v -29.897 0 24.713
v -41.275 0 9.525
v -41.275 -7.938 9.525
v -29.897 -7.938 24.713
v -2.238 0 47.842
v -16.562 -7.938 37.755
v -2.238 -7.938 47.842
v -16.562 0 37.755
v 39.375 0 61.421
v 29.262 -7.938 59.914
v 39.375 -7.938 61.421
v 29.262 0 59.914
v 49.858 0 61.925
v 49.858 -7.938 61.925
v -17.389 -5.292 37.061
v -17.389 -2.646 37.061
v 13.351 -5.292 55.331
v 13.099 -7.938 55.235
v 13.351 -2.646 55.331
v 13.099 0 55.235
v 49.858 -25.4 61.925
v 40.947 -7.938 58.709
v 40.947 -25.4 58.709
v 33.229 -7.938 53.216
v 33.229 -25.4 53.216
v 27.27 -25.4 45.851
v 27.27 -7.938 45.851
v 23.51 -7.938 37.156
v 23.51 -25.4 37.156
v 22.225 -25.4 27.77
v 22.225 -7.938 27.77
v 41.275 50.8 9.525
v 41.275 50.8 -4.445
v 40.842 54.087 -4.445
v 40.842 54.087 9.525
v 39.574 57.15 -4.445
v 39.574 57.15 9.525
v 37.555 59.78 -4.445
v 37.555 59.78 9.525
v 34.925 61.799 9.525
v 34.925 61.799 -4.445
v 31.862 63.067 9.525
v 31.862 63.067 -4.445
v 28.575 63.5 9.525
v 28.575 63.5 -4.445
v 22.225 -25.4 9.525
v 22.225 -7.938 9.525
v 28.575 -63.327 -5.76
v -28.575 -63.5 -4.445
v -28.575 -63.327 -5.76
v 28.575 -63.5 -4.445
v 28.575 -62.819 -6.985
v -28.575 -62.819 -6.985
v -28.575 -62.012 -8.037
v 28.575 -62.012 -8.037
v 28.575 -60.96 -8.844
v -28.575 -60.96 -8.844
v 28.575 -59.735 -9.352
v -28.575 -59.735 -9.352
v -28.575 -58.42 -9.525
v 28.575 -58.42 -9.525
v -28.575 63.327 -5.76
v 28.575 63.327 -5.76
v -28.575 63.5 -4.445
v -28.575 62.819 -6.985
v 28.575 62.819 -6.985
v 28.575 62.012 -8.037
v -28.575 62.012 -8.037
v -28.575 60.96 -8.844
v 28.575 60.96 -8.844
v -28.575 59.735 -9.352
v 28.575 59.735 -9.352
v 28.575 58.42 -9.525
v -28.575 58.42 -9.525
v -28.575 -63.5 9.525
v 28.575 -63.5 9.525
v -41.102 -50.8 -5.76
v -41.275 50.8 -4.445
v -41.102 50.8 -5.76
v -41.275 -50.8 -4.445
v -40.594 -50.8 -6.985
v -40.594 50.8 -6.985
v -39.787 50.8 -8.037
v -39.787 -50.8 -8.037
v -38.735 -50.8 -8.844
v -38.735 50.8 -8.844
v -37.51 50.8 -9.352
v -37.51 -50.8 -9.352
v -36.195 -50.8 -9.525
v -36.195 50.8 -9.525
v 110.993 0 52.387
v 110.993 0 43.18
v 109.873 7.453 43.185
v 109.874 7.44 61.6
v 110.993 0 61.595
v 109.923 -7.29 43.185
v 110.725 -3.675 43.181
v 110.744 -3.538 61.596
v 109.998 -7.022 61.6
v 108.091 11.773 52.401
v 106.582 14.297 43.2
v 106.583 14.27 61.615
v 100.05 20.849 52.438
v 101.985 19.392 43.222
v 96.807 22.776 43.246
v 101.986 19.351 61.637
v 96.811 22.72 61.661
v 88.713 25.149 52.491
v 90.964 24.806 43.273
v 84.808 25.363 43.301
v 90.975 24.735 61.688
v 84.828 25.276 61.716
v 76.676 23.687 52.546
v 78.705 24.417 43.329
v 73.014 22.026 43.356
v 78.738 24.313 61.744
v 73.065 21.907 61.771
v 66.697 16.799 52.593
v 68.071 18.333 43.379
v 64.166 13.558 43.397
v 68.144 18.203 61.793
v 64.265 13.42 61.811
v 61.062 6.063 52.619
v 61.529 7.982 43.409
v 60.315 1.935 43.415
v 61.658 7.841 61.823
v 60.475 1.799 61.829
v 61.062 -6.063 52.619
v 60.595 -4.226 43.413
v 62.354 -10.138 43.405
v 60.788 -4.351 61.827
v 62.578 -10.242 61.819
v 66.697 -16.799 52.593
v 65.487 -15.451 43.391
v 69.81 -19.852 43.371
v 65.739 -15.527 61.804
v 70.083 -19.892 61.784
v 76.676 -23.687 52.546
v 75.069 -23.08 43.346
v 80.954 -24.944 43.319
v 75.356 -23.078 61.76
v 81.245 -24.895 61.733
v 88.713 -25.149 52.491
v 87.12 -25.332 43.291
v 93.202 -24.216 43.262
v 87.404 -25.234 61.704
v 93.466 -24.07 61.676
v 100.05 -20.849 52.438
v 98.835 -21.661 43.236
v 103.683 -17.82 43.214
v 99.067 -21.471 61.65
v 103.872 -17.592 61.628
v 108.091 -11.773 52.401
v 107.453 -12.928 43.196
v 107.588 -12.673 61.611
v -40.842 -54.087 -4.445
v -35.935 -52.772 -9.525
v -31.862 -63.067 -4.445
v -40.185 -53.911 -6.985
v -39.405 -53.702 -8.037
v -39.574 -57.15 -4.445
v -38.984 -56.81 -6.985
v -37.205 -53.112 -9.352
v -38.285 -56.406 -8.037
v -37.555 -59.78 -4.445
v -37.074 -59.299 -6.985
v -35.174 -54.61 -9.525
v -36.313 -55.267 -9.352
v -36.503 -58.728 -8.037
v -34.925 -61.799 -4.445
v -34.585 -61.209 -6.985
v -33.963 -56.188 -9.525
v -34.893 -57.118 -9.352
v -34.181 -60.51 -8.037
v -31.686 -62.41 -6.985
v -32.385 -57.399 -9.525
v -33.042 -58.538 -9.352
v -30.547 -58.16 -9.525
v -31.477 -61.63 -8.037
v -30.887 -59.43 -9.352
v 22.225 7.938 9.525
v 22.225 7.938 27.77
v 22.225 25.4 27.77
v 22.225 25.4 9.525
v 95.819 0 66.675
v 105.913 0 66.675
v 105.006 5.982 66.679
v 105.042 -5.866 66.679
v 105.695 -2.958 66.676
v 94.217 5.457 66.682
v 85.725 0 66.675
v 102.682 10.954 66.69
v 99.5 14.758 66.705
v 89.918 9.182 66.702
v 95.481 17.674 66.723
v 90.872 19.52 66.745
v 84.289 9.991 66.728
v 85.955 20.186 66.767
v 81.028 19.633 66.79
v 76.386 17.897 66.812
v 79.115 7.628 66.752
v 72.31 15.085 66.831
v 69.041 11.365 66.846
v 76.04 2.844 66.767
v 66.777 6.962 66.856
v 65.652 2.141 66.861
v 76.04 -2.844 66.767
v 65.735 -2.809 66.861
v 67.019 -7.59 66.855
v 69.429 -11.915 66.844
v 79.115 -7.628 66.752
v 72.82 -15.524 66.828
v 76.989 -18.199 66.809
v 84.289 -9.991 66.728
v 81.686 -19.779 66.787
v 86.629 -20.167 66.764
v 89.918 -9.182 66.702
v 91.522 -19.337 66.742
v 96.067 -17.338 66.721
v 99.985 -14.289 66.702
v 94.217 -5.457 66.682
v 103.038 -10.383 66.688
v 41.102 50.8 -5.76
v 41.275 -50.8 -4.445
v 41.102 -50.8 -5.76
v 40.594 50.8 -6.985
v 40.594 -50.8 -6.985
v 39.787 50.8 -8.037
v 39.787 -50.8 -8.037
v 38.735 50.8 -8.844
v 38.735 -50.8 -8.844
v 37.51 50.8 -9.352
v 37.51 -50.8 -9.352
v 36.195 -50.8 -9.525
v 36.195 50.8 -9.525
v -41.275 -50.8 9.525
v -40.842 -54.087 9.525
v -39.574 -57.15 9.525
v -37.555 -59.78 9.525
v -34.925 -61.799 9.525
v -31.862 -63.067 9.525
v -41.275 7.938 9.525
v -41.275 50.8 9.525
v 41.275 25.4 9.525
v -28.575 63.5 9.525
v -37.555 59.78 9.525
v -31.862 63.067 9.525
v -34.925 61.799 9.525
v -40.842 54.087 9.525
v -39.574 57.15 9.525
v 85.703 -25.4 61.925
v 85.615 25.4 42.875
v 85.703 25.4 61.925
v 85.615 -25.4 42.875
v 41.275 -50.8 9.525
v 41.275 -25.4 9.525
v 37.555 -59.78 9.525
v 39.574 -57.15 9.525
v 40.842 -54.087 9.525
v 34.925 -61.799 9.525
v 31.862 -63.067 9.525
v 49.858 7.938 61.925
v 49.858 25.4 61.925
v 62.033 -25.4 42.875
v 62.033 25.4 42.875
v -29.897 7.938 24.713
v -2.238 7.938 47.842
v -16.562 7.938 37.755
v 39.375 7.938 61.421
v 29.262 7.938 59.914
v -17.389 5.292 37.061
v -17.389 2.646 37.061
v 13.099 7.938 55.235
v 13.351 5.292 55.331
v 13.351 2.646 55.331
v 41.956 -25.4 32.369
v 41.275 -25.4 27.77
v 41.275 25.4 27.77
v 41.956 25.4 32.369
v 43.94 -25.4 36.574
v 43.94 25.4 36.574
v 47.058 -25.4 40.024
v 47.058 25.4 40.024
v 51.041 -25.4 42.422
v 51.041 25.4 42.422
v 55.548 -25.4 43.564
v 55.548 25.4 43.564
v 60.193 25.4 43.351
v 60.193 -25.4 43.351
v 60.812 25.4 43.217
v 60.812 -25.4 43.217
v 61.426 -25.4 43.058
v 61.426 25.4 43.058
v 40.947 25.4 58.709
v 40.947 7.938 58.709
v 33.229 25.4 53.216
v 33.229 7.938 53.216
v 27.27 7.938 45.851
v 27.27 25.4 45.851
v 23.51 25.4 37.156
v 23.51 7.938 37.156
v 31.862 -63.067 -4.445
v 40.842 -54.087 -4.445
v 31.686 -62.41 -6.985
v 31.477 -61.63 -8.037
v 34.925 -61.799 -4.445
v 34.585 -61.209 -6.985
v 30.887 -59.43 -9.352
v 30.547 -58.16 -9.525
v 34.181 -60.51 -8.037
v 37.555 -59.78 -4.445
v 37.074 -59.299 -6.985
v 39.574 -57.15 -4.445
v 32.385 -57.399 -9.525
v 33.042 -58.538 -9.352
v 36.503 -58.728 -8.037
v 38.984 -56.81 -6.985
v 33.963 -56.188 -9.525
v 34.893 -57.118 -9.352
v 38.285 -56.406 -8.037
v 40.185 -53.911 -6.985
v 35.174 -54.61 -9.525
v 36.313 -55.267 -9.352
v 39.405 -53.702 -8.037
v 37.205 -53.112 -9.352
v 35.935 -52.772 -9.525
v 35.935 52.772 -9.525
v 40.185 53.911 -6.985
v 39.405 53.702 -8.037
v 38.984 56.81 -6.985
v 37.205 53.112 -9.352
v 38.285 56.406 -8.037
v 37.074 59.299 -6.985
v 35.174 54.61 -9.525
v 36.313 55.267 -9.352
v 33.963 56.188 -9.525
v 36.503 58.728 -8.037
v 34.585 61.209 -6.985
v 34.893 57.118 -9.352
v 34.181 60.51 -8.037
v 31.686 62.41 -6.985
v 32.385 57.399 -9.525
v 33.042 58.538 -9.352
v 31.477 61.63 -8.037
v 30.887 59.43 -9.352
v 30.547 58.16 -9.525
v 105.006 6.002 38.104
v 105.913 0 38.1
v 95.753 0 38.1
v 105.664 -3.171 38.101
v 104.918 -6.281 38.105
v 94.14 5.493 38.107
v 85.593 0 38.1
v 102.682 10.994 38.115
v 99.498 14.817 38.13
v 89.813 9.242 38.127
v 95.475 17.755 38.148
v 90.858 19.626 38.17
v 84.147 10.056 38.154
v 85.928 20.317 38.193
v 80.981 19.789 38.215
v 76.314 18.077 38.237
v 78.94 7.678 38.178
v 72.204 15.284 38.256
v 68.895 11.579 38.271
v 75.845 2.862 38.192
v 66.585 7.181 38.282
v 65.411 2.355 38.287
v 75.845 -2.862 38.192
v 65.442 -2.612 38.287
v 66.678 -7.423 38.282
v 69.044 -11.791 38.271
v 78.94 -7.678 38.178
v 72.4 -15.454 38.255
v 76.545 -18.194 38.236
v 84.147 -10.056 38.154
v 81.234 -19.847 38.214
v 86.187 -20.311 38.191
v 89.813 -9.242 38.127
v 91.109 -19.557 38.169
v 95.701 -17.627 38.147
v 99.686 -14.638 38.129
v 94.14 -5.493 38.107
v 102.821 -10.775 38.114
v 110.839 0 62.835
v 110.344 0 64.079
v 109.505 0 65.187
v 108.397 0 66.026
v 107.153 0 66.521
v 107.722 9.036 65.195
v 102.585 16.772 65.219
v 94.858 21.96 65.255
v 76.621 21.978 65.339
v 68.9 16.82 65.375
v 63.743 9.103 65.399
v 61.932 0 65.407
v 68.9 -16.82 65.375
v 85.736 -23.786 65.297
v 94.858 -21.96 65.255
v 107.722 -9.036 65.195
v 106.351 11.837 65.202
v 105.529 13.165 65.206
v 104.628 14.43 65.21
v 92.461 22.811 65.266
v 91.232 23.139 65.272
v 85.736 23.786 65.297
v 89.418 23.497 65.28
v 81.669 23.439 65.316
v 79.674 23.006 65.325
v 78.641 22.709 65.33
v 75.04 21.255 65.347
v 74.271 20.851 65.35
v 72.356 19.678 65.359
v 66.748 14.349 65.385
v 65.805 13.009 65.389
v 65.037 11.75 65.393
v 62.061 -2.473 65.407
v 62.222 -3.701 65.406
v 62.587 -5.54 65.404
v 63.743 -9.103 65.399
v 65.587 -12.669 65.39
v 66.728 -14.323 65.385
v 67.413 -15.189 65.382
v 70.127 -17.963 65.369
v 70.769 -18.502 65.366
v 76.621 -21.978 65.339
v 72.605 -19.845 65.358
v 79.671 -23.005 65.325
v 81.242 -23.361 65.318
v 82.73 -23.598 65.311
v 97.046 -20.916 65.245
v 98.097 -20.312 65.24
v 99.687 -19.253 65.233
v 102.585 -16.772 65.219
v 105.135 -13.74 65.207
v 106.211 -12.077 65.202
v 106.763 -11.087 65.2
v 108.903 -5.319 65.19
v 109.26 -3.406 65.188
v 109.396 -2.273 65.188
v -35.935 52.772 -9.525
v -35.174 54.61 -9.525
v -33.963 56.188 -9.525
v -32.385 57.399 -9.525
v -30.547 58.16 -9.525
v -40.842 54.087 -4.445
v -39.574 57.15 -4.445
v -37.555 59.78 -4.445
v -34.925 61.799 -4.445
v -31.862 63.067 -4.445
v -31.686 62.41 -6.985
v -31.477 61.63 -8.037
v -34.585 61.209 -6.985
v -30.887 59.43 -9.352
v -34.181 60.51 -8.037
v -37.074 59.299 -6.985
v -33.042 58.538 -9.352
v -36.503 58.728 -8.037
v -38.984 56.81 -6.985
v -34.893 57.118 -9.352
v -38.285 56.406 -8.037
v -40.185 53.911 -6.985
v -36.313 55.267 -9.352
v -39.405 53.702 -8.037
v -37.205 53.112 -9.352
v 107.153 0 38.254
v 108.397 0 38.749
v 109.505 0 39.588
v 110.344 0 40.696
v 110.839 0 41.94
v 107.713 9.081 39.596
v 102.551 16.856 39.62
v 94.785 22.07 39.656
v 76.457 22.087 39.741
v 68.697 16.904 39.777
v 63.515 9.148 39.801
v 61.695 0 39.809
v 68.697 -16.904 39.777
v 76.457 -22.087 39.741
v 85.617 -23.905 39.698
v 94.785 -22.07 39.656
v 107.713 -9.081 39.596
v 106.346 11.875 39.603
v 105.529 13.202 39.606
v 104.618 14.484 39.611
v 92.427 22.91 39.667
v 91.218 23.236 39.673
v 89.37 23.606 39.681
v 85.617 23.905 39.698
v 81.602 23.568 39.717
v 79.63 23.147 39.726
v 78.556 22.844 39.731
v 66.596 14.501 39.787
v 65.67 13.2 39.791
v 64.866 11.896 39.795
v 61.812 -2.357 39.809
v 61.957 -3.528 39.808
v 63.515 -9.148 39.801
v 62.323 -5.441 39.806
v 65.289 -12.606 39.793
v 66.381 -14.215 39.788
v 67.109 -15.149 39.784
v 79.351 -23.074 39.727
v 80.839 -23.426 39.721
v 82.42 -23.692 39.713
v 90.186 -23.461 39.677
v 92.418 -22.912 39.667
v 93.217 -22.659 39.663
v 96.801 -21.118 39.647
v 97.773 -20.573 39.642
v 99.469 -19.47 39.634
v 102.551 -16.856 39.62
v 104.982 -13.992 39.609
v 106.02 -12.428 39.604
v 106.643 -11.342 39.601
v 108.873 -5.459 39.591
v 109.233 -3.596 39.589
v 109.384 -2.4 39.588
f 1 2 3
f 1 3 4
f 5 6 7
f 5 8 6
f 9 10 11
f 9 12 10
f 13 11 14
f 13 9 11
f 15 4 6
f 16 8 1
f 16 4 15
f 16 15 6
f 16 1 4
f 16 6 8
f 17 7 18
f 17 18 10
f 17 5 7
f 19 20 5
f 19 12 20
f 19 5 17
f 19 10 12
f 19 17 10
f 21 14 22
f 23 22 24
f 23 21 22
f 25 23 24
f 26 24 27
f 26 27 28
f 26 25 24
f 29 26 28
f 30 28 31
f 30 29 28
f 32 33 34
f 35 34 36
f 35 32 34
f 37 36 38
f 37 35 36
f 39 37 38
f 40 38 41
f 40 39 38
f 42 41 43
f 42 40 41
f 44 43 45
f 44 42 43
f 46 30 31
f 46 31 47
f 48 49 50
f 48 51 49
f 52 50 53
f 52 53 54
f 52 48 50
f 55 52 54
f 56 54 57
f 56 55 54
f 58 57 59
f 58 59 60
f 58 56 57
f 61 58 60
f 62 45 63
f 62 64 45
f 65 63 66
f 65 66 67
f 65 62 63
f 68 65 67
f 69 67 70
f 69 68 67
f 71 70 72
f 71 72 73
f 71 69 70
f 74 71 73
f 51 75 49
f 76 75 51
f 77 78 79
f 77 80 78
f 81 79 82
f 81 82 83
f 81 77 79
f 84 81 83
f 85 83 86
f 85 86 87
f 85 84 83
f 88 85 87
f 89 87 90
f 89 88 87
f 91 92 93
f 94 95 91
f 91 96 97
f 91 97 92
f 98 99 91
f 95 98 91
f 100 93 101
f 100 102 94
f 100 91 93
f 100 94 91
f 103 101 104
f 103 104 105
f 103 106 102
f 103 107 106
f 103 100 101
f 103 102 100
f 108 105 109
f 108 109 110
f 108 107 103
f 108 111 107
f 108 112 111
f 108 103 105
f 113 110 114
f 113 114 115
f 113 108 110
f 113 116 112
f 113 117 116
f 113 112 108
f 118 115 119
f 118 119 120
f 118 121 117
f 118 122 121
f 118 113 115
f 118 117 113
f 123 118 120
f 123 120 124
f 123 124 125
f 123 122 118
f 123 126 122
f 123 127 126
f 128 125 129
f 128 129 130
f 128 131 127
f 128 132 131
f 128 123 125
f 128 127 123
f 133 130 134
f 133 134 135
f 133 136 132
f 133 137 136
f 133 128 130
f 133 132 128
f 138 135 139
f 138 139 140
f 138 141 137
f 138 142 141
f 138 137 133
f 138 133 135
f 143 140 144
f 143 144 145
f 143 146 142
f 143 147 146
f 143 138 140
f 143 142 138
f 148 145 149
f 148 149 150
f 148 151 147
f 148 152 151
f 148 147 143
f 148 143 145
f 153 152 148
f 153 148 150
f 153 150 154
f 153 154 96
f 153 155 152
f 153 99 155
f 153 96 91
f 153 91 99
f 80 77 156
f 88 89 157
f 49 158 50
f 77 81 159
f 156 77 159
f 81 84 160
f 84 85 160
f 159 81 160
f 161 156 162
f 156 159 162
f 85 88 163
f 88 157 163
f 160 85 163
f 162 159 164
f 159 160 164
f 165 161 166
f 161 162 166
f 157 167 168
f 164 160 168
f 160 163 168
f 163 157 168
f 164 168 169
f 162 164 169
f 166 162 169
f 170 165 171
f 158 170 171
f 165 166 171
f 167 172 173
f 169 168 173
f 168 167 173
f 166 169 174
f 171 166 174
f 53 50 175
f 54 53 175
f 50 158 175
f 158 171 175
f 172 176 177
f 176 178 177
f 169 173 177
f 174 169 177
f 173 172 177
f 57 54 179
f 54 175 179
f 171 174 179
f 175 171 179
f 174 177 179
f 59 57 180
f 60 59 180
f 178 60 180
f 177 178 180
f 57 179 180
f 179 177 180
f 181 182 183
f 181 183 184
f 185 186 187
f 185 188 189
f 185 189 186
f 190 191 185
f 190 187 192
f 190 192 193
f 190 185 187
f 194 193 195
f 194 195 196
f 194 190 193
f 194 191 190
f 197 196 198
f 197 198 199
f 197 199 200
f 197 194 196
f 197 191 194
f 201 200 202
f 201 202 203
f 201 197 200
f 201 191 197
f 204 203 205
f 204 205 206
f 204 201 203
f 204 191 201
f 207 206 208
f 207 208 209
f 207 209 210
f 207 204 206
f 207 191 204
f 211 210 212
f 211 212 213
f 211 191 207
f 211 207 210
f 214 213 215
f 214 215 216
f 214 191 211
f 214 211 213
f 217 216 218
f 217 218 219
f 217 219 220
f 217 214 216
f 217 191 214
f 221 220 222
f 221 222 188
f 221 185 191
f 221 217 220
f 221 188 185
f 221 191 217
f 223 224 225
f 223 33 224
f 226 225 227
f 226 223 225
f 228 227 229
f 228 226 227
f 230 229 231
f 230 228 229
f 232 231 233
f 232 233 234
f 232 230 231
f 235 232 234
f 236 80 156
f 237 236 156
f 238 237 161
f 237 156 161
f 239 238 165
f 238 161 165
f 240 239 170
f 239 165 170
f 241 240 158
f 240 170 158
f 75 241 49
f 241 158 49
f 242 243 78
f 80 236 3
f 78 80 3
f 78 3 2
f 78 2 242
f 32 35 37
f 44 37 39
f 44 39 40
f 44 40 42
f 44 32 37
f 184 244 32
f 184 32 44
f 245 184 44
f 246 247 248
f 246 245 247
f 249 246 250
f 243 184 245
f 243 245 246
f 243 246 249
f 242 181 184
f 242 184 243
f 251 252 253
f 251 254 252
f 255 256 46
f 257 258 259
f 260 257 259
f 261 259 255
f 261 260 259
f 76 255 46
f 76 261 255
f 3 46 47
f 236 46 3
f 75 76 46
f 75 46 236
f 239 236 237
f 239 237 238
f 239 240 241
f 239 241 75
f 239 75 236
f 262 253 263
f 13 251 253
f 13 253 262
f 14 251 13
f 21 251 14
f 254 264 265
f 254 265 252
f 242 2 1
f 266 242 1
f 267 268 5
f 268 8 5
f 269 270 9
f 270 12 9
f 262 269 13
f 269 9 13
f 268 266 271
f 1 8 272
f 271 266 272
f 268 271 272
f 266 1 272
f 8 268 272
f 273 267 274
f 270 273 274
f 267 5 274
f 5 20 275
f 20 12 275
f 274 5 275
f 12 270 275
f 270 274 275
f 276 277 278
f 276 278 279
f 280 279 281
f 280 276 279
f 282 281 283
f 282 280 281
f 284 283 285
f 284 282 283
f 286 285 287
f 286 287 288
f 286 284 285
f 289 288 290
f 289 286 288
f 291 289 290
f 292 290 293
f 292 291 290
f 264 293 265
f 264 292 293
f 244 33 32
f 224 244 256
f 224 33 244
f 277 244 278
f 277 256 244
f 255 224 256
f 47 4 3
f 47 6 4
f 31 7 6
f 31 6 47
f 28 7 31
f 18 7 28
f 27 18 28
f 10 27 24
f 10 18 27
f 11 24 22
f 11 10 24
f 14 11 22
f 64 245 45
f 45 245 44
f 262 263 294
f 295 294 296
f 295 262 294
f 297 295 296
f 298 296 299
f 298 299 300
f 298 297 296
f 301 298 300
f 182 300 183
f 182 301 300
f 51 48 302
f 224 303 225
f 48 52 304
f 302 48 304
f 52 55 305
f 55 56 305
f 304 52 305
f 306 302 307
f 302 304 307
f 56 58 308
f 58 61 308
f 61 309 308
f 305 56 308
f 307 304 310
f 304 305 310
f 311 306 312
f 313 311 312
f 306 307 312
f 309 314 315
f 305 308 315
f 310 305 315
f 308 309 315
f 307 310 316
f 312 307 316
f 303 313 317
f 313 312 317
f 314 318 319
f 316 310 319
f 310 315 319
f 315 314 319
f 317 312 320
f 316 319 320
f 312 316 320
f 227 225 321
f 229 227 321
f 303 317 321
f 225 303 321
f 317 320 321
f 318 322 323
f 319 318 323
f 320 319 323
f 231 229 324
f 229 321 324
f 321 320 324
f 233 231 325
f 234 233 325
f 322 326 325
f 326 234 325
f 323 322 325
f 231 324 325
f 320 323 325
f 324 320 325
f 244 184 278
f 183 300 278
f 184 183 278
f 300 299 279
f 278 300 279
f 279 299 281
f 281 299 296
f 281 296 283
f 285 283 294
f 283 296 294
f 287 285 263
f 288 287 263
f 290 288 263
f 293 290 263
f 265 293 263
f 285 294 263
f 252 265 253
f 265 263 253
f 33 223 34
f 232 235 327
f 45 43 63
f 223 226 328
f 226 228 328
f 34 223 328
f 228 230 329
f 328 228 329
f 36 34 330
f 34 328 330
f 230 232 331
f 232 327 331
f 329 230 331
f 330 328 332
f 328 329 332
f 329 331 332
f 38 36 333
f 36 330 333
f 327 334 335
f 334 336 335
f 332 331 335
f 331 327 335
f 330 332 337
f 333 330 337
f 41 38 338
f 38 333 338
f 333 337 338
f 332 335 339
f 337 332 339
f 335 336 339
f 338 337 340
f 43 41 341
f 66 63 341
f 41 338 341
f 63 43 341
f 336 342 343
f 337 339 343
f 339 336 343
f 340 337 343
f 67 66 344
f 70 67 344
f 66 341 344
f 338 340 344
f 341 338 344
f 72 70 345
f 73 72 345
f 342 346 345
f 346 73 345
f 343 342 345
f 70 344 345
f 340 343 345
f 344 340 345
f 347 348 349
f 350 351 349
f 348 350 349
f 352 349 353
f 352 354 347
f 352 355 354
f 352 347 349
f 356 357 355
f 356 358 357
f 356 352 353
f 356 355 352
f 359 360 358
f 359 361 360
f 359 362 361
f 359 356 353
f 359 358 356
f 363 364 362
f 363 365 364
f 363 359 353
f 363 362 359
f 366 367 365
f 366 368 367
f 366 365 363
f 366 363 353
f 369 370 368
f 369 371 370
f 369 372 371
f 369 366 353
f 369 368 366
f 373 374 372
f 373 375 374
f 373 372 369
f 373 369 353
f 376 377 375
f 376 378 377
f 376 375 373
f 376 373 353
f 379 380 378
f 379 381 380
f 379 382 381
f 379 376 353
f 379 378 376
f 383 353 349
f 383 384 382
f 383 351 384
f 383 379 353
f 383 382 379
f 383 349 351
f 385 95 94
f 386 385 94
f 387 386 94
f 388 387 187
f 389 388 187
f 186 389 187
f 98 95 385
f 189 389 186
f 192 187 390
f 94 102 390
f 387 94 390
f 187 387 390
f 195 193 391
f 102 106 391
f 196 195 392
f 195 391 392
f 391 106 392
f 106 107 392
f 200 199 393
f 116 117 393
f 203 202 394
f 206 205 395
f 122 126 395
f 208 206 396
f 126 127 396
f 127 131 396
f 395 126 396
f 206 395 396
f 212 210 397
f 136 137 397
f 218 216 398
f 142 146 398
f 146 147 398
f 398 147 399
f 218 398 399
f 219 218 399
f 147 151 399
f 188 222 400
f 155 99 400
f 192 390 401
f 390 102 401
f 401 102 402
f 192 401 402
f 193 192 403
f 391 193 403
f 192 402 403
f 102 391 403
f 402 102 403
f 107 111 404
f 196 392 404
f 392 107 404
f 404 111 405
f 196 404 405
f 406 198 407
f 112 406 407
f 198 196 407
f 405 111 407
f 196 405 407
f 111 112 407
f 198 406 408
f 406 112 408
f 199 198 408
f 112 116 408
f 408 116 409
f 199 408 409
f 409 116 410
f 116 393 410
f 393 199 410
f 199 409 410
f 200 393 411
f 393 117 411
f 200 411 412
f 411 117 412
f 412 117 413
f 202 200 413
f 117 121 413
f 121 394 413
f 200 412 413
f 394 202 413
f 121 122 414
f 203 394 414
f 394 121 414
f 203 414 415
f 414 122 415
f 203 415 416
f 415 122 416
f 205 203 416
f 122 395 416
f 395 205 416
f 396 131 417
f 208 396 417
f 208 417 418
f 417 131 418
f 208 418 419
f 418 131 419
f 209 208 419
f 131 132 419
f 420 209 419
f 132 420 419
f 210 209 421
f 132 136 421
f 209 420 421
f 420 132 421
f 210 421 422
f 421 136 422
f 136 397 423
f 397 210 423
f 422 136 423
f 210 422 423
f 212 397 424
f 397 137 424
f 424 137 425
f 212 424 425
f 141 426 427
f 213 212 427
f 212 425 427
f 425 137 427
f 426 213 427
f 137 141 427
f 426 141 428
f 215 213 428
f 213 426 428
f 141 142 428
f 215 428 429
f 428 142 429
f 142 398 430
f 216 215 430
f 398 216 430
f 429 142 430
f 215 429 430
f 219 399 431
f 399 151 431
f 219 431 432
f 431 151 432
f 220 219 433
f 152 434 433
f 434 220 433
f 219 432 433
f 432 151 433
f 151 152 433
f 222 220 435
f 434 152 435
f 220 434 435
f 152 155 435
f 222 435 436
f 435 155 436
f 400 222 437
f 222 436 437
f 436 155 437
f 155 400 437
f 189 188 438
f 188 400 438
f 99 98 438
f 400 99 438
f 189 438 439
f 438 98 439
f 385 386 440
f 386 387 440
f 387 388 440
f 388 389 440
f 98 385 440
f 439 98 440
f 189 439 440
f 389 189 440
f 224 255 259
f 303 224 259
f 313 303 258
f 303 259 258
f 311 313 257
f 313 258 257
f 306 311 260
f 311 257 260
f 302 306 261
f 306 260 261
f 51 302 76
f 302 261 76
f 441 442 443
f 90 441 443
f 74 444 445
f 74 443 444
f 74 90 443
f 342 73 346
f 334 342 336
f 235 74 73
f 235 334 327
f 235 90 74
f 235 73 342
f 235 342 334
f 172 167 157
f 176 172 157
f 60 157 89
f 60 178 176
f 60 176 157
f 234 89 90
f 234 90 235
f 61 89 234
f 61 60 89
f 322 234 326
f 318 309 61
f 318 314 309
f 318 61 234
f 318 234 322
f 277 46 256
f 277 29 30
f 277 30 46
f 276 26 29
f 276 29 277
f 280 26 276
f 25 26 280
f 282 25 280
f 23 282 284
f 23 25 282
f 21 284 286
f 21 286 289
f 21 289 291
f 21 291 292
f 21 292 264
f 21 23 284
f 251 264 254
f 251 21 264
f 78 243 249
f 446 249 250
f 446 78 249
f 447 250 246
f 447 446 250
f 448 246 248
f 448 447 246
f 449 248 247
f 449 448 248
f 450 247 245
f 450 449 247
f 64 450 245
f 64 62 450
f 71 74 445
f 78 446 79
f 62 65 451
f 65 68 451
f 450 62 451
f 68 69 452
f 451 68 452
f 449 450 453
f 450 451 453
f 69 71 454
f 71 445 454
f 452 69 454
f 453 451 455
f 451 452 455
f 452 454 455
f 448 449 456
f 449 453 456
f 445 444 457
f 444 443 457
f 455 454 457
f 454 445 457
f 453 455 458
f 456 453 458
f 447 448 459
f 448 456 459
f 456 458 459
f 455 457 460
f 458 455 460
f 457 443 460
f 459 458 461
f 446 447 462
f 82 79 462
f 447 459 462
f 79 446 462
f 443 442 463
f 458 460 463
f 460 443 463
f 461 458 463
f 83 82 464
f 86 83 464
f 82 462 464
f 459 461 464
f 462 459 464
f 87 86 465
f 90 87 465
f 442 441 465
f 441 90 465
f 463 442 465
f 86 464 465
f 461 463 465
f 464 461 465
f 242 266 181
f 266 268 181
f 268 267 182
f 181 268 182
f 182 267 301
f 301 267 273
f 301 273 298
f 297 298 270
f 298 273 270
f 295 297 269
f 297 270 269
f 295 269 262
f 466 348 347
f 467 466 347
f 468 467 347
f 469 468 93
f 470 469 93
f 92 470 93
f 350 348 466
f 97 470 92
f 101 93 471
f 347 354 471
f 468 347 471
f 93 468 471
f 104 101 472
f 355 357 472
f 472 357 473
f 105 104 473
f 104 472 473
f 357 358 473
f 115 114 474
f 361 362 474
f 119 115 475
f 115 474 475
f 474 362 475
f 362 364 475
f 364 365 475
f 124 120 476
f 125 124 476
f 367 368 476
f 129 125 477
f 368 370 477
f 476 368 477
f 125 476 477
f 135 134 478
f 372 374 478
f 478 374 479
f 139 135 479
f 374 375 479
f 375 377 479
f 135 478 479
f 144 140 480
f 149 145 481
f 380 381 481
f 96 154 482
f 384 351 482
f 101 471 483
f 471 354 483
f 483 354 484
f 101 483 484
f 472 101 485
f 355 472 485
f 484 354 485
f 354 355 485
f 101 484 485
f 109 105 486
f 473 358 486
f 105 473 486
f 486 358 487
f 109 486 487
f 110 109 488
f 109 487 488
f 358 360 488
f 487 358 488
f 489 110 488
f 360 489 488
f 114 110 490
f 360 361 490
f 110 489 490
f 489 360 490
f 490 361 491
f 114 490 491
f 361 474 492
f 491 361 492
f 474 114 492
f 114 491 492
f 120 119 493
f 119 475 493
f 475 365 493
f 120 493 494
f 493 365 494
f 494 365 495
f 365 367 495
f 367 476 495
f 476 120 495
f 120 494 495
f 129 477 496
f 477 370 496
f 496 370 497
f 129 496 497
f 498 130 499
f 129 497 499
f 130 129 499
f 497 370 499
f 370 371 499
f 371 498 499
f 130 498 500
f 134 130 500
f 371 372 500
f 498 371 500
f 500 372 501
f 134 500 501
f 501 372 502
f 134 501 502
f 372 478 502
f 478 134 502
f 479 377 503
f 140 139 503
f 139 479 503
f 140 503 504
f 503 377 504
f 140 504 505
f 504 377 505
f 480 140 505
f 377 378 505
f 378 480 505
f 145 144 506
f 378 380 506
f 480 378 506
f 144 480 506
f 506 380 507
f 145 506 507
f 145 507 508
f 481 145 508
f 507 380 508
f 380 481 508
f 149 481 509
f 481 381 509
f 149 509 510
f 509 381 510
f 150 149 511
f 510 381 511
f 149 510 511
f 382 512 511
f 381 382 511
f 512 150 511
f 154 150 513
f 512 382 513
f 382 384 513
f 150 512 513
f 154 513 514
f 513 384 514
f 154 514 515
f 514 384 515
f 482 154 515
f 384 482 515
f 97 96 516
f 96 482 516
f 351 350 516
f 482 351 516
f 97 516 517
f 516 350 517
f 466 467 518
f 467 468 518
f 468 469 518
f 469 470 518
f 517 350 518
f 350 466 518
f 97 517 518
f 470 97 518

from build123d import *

# Parameters (mm, degrees)
F1_DEPTH = 63.5
F2_DEPTH = 25.4
F3_DEPTH = 7.9375
F5_R     = 12.7
F6_R     = 5.08
F7_R     = 5.08


with BuildPart() as f1:
    # F0 (on Front) → F1 (new body, symmetric)
    with BuildSketch(Plane.XZ):
        Polygon((-41.275, 9.525), (-41.275, -9.525), (41.275, -9.525), (41.275, 9.525), (22.225, 9.525), align=None)
    extrude(amount=F1_DEPTH, both=True)

    # F0 (on Front) → F2 (join, symmetric)
    with BuildSketch(Plane.XZ):
        with BuildLine():
            Line((22.225, 9.525), (41.275, 9.525))
            Line((41.275, 9.525), (41.275, 27.7698307051))
            ThreePointArc((41.275, 27.7698307051), (47.0576144119, 40.0237842769), (60.192716931, 43.3505077982))
            Line((60.192716931, 43.3505077982), (60.192716931, 61.9252))
            Line((60.192716931, 61.9252), (49.8584724968, 61.9252))
            ThreePointArc((49.8584724968, 61.9252), (29.9984602366, 49.7368403668), (22.225, 27.7698307051))
            Line((22.225, 27.7698307051), (22.225, 9.525))
        make_face()
        with BuildLine():
            Line((85.7030116143, 61.9252), (60.192716931, 61.9252))
            Line((60.192716931, 61.9252), (60.192716931, 43.3505077982))
            ThreePointArc((60.192716931, 43.3505077982), (61.1199656119, 43.1404194395), (62.0329748581, 42.8752))
            Line((62.0329748581, 42.8752), (85.6148229017, 42.8752))
            Line((85.6148229017, 42.8752), (85.7030116143, 61.9252))
        make_face()
    extrude(amount=F2_DEPTH, both=True)

    # F0 (on Front) → F3 (join, symmetric)
    with BuildSketch(Plane.XZ):
        Polygon((-41.275, 9.525), (-41.275, -9.525), (41.275, -9.525), (41.275, 9.525), (22.225, 9.525), align=None)
        with BuildLine():
            add(Edge.make_bspline(
                [(-41.275, 9.525), (-21.1780890918, 40.889163718), (10.8302186142, 61.9736168474), (49.8584724968, 61.9252)],
                knots=[0, 0, 0, 0, 105.1241683409, 105.1241683409, 105.1241683409, 105.1241683409], degree=3))
            Line((-41.275, 9.525), (22.225, 9.525))
            Line((22.225, 9.525), (22.225, 27.7698307051))
            ThreePointArc((22.225, 27.7698307051), (29.9984602366, 49.7368403668), (49.8584724968, 61.9252))
        make_face()
        with BuildLine():
            Line((22.225, 9.525), (41.275, 9.525))
            Line((41.275, 9.525), (41.275, 27.7698307051))
            ThreePointArc((41.275, 27.7698307051), (47.0576144119, 40.0237842769), (60.192716931, 43.3505077982))
            Line((60.192716931, 43.3505077982), (60.192716931, 61.9252))
            Line((60.192716931, 61.9252), (49.8584724968, 61.9252))
            ThreePointArc((49.8584724968, 61.9252), (29.9984602366, 49.7368403668), (22.225, 27.7698307051))
            Line((22.225, 27.7698307051), (22.225, 9.525))
        make_face()
        with BuildLine():
            Line((85.7030116143, 61.9252), (60.192716931, 61.9252))
            Line((60.192716931, 61.9252), (60.192716931, 43.3505077982))
            ThreePointArc((60.192716931, 43.3505077982), (61.1199656119, 43.1404194395), (62.0329748581, 42.8752))
            Line((62.0329748581, 42.8752), (85.6148229017, 42.8752))
            Line((85.6148229017, 42.8752), (85.7030116143, 61.9252))
        make_face()
    extrude(amount=F3_DEPTH, both=True)

    # F5
    f5_edges = [f1.edges().sort_by_distance(p)[0] for p in [
        (-41.275, -63.5, 0),
        (41.275, -63.5, 0),
        (41.275, 63.5, 0),
        (-41.275, 63.5, 0),
    ]]
    fillet(f5_edges, radius=F5_R)

    # F7
    f7_edges = [f1.edges().sort_by_distance(p)[0] for p in [
        (-41.275, 0, -9.525),
        (-37.555256, 59.780256, -9.525),
        (-37.555256, -59.780256, -9.525),
        (0, 63.5, -9.525),
        (0, -63.5, -9.525),
        (37.555256, 59.780256, -9.525),
        (37.555256, -59.780256, -9.525),
        (41.275, 0, -9.525),
    ]]
    fillet(f7_edges, radius=F7_R)


with BuildPart() as f4:
    # F0 (on Front) → F4 (revolve)
    with BuildSketch(Plane.XZ):
        Polygon((85.725, 66.675), (85.7030116143, 61.9252), (85.6148229017, 42.8752), (85.592716931, 38.1), (110.992716931, 38.1), (110.992716931, 66.675), align=None)
    revolve(axis=Axis((85.6588584655, 0, 52.3875), (0.0046292791, 0, 0.9999892848)))

    # F6
    f6_edges = [f4.edges().sort_by_distance(p)[0] for p in [
        (60.458366, 0, 66.90894),
        (60.193806, 0, 38.335165),
    ]]
    fillet(f6_edges, radius=F6_R)


solid = Compound([f1.part, f4.part])
